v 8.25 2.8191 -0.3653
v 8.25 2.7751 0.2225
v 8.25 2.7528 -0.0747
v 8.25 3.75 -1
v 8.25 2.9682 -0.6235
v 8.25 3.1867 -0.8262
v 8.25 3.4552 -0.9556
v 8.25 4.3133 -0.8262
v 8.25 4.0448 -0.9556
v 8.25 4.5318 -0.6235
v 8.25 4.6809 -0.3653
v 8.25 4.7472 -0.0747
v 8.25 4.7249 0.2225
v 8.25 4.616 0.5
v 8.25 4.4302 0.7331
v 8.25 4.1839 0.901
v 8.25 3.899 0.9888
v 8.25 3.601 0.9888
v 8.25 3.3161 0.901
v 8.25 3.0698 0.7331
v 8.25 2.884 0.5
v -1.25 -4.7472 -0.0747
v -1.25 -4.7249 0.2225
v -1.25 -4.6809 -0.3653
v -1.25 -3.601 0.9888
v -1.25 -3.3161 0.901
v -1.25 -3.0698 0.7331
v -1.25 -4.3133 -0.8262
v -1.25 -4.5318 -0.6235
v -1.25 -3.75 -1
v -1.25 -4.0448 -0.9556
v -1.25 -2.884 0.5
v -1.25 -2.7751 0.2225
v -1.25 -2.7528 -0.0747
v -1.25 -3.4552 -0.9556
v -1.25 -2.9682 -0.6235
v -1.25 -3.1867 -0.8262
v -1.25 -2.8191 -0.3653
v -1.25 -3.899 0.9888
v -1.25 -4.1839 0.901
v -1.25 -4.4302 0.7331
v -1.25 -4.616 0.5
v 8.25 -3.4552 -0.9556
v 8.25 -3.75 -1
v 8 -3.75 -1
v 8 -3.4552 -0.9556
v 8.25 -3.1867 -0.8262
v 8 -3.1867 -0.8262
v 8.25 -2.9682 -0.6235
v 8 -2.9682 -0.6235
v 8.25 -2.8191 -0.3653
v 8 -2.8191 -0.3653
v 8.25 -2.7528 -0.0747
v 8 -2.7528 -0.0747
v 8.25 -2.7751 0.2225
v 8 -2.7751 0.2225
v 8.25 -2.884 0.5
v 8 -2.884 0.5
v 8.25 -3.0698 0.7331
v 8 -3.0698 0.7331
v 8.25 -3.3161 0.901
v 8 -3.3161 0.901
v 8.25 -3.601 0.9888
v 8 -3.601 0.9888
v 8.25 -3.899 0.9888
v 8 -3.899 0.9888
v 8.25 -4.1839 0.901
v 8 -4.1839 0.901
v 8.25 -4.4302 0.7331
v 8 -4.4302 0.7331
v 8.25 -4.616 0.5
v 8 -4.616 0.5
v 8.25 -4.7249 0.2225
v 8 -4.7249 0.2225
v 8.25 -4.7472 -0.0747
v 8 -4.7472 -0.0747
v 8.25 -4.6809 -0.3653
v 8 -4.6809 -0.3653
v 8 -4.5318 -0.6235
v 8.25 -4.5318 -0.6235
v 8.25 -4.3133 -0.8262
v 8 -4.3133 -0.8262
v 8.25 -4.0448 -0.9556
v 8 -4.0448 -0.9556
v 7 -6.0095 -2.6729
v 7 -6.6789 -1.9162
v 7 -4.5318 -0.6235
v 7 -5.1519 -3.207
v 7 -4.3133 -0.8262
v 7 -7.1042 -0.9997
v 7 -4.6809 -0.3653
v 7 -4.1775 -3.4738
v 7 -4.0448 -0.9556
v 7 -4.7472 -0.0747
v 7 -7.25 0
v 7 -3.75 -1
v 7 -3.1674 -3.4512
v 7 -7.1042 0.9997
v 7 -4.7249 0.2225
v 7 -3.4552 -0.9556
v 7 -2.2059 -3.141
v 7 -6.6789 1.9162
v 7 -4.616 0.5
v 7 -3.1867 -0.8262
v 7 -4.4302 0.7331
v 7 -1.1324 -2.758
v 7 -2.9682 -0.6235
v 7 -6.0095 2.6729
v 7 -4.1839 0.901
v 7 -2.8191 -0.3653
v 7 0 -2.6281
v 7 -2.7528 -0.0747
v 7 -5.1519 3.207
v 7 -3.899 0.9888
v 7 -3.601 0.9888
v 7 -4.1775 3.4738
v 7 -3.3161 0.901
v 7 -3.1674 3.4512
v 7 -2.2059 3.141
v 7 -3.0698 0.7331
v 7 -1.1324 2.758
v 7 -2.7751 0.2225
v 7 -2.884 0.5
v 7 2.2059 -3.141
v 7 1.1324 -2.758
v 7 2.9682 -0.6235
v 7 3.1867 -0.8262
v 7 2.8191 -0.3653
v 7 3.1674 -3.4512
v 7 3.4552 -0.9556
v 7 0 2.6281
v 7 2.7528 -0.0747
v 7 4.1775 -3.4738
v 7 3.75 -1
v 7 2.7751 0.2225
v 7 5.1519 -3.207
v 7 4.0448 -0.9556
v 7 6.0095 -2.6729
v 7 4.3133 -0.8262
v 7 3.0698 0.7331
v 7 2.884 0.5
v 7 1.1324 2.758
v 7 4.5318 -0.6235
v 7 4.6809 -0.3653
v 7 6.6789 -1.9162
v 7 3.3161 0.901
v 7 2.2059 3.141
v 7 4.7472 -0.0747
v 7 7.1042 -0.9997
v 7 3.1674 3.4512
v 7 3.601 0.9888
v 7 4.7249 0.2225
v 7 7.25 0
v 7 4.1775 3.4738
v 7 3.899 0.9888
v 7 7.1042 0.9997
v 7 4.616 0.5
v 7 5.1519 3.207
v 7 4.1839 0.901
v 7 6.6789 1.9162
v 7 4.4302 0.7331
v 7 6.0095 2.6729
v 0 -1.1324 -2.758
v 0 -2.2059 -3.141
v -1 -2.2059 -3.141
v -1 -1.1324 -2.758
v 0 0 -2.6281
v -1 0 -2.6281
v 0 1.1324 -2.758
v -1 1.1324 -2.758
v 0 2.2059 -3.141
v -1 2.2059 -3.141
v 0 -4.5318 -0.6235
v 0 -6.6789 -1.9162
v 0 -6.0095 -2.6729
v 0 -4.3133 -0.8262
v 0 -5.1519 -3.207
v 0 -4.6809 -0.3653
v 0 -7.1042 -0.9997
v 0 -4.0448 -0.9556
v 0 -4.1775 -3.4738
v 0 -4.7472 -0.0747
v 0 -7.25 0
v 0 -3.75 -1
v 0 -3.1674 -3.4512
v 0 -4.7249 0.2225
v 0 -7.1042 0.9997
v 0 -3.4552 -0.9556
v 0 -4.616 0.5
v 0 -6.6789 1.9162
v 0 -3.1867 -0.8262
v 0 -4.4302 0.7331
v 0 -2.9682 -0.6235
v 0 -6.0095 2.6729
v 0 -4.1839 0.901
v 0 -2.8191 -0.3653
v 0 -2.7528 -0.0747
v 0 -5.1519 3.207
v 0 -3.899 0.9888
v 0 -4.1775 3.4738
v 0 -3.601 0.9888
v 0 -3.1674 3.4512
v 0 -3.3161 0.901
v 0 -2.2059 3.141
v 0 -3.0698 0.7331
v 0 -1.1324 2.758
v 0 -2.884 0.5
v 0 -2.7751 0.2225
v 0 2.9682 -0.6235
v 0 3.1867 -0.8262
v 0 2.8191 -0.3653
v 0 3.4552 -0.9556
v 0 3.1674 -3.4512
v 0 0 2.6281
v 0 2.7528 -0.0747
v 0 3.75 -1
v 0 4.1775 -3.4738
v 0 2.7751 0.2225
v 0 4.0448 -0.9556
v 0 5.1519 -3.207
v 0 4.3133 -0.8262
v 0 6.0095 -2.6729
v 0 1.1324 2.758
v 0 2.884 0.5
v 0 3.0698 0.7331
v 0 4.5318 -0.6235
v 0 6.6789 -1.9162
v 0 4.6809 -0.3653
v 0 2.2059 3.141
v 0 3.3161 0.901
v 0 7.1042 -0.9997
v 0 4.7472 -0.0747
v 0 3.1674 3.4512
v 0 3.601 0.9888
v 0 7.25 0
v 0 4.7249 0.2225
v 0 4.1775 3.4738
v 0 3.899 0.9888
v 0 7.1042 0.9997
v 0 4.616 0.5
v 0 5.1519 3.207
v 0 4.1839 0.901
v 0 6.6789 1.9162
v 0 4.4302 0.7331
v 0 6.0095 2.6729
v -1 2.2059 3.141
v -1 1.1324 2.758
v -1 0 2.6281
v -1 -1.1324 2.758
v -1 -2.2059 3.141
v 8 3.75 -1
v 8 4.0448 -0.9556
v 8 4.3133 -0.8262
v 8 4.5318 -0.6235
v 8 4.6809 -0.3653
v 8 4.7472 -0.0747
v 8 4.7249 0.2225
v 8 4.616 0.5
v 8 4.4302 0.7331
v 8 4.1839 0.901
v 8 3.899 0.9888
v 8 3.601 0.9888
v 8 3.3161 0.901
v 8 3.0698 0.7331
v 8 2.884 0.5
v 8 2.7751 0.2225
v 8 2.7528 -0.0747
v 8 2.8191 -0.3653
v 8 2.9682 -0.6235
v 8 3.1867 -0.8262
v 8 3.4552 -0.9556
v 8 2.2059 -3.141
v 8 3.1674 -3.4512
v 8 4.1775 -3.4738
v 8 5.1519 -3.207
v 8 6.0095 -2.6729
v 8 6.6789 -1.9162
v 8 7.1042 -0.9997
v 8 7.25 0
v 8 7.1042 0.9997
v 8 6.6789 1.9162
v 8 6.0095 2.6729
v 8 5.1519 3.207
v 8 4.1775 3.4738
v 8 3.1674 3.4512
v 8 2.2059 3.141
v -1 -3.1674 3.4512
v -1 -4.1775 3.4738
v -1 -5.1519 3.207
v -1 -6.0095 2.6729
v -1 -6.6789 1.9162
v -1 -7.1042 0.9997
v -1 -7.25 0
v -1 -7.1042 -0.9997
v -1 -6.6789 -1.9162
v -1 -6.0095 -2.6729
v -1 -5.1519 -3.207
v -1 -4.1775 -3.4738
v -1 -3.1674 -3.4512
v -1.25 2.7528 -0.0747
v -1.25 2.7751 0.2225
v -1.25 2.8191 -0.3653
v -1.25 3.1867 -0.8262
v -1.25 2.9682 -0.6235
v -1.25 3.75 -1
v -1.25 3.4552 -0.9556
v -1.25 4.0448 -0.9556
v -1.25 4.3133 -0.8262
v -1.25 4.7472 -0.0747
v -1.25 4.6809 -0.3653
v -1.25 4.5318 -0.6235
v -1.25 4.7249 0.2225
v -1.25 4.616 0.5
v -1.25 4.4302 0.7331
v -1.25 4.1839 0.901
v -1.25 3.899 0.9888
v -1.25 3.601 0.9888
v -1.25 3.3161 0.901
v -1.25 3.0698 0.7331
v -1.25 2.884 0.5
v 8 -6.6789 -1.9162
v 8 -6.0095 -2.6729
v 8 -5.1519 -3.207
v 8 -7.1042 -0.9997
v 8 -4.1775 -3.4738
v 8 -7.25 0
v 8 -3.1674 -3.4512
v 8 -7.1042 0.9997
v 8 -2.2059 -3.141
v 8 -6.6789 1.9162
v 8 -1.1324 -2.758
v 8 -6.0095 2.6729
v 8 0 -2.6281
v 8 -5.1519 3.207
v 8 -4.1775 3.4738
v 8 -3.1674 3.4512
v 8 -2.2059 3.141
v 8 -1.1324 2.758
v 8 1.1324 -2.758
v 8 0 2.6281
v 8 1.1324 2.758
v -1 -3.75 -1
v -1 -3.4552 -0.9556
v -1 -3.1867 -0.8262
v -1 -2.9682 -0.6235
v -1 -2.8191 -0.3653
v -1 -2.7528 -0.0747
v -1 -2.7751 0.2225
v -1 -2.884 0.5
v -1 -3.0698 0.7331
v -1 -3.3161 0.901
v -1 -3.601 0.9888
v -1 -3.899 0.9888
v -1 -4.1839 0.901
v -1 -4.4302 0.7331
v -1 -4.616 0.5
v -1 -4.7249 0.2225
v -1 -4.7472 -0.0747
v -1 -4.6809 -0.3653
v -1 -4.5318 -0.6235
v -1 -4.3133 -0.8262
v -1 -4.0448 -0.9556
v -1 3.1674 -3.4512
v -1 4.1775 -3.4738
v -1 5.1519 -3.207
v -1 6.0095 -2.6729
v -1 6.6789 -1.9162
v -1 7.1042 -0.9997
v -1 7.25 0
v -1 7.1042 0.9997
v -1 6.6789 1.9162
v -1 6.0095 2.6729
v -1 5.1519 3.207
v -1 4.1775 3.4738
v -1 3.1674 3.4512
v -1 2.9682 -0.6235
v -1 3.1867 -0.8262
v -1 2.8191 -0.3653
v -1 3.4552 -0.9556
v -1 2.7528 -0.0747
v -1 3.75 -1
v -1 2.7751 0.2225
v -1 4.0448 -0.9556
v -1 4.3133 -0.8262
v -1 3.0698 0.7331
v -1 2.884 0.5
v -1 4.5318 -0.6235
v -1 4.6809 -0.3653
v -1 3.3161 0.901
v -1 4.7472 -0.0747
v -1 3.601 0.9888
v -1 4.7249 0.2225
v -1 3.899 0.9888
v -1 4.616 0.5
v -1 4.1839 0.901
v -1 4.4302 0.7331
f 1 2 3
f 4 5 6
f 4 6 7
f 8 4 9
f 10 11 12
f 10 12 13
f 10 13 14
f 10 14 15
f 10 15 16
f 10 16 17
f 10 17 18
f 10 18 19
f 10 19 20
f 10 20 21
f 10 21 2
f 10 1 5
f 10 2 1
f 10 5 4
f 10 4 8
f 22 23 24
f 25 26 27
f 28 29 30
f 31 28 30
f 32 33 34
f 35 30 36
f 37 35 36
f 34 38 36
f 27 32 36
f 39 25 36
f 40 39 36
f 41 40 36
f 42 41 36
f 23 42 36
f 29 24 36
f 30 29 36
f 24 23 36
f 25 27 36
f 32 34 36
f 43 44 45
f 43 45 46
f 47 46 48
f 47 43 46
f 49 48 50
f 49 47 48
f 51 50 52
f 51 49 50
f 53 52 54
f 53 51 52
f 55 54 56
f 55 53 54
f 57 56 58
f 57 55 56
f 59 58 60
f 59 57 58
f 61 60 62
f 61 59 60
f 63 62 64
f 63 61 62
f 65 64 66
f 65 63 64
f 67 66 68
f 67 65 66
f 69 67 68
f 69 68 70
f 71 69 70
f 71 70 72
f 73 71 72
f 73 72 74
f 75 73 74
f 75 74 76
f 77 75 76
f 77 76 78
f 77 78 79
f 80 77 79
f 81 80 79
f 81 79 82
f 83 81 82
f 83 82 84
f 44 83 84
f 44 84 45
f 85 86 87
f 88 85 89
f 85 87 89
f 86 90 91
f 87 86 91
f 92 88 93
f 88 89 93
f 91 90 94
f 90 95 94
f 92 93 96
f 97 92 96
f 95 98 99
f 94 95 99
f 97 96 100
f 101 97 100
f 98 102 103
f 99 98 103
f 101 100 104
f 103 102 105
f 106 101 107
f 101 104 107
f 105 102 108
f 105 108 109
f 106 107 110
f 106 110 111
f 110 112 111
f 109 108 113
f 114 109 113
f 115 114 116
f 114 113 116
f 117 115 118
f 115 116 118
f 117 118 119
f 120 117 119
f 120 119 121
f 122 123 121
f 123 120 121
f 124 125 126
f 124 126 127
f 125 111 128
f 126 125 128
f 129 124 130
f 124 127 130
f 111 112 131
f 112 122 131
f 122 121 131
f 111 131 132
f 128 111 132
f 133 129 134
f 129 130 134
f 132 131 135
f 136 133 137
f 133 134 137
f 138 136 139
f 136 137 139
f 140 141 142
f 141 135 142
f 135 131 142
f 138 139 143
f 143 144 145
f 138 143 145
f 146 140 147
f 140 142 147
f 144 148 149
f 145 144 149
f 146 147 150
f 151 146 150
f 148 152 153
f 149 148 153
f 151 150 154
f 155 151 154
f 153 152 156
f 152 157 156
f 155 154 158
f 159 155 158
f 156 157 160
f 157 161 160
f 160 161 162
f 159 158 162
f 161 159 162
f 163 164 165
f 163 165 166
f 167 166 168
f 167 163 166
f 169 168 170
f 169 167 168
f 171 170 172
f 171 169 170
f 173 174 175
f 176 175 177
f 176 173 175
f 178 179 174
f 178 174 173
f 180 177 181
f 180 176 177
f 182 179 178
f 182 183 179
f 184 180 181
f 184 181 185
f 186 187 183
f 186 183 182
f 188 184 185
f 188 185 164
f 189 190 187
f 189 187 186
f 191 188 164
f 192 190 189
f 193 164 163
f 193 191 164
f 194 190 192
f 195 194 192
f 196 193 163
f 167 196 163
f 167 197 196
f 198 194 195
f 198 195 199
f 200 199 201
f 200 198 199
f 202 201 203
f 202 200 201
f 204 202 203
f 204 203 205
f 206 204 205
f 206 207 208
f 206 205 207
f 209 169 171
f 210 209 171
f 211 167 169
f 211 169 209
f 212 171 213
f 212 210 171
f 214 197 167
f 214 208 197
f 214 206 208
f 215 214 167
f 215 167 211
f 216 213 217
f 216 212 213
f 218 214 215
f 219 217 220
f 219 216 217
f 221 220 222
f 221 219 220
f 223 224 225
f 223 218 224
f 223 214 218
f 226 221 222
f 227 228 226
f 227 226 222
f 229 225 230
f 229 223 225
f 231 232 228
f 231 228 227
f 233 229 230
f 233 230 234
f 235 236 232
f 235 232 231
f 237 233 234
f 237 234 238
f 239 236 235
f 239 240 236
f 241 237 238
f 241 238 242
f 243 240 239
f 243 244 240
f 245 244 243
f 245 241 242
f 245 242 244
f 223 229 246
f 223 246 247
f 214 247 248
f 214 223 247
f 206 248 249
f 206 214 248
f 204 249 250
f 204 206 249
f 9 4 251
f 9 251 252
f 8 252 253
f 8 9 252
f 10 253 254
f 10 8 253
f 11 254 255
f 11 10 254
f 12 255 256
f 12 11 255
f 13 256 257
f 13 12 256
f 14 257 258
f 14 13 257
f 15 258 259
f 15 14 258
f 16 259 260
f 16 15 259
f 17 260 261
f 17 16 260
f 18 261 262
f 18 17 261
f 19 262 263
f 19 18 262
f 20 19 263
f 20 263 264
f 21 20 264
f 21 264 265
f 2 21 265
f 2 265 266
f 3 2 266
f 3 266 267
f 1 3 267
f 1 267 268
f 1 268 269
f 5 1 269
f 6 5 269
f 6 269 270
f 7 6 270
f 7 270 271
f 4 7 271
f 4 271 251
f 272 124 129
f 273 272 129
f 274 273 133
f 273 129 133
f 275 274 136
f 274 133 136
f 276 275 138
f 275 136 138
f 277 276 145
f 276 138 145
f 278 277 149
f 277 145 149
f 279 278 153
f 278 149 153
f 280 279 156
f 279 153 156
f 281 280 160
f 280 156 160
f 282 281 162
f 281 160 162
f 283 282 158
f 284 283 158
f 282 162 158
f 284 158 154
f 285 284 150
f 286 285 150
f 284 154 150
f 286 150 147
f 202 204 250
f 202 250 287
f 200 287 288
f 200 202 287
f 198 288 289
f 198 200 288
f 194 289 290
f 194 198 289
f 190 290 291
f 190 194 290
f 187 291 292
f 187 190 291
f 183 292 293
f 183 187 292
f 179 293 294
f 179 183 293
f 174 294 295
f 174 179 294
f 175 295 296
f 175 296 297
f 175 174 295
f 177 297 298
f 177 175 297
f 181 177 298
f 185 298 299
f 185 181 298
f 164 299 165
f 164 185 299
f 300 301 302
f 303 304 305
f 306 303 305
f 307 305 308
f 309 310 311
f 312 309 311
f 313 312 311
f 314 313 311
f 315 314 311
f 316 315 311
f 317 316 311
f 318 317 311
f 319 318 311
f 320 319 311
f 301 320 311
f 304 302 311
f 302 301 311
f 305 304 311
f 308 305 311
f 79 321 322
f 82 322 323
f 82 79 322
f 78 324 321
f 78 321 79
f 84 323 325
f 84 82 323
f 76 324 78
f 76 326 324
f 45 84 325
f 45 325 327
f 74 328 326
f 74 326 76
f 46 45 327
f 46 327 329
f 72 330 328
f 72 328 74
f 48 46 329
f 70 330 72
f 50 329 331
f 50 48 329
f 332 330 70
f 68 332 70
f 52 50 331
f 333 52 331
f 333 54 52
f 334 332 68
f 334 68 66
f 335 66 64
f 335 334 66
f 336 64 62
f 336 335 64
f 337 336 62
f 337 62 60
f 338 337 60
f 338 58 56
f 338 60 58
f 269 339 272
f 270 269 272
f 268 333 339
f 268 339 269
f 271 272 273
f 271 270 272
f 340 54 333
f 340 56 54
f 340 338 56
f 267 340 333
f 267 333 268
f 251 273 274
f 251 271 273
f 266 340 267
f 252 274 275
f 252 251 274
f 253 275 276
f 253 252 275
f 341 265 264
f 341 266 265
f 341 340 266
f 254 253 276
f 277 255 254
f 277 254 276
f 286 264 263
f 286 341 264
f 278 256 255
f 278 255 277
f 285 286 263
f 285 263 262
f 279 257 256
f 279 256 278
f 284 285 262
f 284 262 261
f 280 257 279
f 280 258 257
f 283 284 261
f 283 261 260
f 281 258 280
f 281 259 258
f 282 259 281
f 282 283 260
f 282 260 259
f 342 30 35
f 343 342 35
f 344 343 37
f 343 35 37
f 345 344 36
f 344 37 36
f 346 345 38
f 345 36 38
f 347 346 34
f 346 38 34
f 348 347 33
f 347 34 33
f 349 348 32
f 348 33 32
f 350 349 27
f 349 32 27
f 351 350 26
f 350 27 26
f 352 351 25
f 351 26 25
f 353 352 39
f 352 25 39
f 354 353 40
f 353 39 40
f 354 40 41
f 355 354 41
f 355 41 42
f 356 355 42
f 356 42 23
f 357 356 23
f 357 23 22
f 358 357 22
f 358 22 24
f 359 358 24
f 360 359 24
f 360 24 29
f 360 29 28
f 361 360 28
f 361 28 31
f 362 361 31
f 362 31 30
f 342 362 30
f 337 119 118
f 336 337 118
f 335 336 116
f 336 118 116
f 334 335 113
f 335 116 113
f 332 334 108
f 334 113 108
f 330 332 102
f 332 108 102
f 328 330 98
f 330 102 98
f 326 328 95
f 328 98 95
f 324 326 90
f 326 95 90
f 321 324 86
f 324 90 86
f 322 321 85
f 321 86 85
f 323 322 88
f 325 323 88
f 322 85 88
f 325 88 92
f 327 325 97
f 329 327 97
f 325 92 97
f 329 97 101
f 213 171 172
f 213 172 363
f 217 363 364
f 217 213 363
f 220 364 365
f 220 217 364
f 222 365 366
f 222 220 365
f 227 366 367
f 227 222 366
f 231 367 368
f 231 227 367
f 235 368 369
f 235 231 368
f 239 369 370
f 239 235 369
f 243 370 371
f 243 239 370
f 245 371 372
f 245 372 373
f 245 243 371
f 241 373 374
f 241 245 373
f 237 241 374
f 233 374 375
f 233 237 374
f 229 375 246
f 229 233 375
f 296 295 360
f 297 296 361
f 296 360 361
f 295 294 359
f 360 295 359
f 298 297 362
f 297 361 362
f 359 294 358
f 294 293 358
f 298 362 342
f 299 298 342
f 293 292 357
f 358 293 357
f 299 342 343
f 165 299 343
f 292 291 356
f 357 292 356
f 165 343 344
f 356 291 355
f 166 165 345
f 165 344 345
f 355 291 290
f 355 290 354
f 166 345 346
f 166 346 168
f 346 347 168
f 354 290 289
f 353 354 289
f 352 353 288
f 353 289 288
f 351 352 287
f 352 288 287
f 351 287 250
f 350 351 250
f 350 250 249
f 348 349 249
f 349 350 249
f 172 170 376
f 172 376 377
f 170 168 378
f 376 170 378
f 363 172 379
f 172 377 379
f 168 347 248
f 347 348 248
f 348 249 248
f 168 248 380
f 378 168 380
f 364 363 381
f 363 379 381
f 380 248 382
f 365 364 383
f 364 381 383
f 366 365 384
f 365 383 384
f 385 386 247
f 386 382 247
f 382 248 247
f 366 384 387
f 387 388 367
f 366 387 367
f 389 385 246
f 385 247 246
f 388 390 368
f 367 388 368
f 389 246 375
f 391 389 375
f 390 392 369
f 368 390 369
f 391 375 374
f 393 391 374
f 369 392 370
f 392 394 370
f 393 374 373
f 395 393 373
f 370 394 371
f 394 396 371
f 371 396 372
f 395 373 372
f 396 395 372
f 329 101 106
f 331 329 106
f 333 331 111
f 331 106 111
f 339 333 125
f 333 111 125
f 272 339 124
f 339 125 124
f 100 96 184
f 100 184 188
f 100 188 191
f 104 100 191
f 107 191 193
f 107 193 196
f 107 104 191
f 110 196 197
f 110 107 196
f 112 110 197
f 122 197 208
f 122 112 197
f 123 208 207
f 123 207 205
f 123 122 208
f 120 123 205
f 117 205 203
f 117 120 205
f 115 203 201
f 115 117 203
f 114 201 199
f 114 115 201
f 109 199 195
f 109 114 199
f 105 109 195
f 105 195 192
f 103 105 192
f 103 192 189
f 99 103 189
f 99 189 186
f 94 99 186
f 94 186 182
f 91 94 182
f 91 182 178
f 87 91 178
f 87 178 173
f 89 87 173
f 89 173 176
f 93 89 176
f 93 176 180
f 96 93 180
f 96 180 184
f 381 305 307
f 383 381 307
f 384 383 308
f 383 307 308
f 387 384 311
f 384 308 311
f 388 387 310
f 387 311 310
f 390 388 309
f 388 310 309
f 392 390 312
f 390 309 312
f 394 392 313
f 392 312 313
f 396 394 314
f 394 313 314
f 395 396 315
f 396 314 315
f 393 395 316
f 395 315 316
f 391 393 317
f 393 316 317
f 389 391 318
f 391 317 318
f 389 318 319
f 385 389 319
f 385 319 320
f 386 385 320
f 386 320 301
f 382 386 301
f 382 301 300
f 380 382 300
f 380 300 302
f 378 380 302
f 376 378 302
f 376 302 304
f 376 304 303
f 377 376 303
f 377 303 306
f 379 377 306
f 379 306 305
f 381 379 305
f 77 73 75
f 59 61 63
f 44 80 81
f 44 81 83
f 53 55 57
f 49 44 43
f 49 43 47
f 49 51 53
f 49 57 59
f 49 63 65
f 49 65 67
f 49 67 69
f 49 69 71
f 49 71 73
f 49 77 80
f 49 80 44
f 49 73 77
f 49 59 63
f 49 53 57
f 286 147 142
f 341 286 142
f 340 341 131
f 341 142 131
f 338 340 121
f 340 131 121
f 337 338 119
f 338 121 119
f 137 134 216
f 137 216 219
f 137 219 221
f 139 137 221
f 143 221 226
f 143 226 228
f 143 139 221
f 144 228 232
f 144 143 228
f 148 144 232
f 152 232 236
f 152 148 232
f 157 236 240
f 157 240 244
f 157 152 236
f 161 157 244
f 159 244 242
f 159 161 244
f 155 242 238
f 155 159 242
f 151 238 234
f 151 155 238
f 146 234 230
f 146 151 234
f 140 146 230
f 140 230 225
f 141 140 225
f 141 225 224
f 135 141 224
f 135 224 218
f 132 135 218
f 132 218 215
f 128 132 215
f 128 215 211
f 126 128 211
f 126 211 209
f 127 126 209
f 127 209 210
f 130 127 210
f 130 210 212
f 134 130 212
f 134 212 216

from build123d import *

# Parameters (mm, degrees)
SKETCH2_R                = 1
BOSS_EXTRUDE1_DEPTH      = 1
BOSS_EXTRUDE2_DEPTH      = 3.5
BOSS_EXTRUDE2_DEPTH_BACK = 1.25
SKETCH2_3_R              = 1


with BuildPart() as part:
    # Sketch2 → Boss-Extrude1 (new body)
    with BuildSketch(Plane.YZ):
        with BuildLine():
            ThreePointArc((-2.205882353, 3.140971298), (-7.25, 0), (-2.205882353, -3.140971298))
            ThreePointArc((-2.205882353, -3.140971298), (0, -2.628073151), (2.205882353, -3.140971298))
            ThreePointArc((2.205882353, -3.140971298), (7.25, 0), (2.205882353, 3.140971298))
            ThreePointArc((2.205882353, 3.140971298), (0, 2.628073151), (-2.205882353, 3.140971298))
        make_face()
        with Locations((-3.75, 0)):
            Circle(SKETCH2_R, mode=Mode.SUBTRACT)
        with Locations((3.75, 0)):
            Circle(SKETCH2_R, mode=Mode.SUBTRACT)
    extrude(amount=-BOSS_EXTRUDE1_DEPTH)

    # Sketch2<3> → Boss-Extrude2 (add, two sides: drawn at the far end of the back side and taken through both)
    with BuildSketch(Plane.YZ.offset(-BOSS_EXTRUDE2_DEPTH_BACK)):
        with Locations((-3.75, 0)):
            Circle(SKETCH2_3_R)
        with Locations((3.75, 0)):
            Circle(SKETCH2_3_R)
    extrude(amount=BOSS_EXTRUDE2_DEPTH + BOSS_EXTRUDE2_DEPTH_BACK)

    # Mirror1: part across plane


with BuildPart() as part_1:
    add(part.part)
    add(part.part.mirror(Plane(origin=(3.5, 0, 0), x_dir=(0, 0, 1), z_dir=(1, 0, 0))))


solid = part_1.part
